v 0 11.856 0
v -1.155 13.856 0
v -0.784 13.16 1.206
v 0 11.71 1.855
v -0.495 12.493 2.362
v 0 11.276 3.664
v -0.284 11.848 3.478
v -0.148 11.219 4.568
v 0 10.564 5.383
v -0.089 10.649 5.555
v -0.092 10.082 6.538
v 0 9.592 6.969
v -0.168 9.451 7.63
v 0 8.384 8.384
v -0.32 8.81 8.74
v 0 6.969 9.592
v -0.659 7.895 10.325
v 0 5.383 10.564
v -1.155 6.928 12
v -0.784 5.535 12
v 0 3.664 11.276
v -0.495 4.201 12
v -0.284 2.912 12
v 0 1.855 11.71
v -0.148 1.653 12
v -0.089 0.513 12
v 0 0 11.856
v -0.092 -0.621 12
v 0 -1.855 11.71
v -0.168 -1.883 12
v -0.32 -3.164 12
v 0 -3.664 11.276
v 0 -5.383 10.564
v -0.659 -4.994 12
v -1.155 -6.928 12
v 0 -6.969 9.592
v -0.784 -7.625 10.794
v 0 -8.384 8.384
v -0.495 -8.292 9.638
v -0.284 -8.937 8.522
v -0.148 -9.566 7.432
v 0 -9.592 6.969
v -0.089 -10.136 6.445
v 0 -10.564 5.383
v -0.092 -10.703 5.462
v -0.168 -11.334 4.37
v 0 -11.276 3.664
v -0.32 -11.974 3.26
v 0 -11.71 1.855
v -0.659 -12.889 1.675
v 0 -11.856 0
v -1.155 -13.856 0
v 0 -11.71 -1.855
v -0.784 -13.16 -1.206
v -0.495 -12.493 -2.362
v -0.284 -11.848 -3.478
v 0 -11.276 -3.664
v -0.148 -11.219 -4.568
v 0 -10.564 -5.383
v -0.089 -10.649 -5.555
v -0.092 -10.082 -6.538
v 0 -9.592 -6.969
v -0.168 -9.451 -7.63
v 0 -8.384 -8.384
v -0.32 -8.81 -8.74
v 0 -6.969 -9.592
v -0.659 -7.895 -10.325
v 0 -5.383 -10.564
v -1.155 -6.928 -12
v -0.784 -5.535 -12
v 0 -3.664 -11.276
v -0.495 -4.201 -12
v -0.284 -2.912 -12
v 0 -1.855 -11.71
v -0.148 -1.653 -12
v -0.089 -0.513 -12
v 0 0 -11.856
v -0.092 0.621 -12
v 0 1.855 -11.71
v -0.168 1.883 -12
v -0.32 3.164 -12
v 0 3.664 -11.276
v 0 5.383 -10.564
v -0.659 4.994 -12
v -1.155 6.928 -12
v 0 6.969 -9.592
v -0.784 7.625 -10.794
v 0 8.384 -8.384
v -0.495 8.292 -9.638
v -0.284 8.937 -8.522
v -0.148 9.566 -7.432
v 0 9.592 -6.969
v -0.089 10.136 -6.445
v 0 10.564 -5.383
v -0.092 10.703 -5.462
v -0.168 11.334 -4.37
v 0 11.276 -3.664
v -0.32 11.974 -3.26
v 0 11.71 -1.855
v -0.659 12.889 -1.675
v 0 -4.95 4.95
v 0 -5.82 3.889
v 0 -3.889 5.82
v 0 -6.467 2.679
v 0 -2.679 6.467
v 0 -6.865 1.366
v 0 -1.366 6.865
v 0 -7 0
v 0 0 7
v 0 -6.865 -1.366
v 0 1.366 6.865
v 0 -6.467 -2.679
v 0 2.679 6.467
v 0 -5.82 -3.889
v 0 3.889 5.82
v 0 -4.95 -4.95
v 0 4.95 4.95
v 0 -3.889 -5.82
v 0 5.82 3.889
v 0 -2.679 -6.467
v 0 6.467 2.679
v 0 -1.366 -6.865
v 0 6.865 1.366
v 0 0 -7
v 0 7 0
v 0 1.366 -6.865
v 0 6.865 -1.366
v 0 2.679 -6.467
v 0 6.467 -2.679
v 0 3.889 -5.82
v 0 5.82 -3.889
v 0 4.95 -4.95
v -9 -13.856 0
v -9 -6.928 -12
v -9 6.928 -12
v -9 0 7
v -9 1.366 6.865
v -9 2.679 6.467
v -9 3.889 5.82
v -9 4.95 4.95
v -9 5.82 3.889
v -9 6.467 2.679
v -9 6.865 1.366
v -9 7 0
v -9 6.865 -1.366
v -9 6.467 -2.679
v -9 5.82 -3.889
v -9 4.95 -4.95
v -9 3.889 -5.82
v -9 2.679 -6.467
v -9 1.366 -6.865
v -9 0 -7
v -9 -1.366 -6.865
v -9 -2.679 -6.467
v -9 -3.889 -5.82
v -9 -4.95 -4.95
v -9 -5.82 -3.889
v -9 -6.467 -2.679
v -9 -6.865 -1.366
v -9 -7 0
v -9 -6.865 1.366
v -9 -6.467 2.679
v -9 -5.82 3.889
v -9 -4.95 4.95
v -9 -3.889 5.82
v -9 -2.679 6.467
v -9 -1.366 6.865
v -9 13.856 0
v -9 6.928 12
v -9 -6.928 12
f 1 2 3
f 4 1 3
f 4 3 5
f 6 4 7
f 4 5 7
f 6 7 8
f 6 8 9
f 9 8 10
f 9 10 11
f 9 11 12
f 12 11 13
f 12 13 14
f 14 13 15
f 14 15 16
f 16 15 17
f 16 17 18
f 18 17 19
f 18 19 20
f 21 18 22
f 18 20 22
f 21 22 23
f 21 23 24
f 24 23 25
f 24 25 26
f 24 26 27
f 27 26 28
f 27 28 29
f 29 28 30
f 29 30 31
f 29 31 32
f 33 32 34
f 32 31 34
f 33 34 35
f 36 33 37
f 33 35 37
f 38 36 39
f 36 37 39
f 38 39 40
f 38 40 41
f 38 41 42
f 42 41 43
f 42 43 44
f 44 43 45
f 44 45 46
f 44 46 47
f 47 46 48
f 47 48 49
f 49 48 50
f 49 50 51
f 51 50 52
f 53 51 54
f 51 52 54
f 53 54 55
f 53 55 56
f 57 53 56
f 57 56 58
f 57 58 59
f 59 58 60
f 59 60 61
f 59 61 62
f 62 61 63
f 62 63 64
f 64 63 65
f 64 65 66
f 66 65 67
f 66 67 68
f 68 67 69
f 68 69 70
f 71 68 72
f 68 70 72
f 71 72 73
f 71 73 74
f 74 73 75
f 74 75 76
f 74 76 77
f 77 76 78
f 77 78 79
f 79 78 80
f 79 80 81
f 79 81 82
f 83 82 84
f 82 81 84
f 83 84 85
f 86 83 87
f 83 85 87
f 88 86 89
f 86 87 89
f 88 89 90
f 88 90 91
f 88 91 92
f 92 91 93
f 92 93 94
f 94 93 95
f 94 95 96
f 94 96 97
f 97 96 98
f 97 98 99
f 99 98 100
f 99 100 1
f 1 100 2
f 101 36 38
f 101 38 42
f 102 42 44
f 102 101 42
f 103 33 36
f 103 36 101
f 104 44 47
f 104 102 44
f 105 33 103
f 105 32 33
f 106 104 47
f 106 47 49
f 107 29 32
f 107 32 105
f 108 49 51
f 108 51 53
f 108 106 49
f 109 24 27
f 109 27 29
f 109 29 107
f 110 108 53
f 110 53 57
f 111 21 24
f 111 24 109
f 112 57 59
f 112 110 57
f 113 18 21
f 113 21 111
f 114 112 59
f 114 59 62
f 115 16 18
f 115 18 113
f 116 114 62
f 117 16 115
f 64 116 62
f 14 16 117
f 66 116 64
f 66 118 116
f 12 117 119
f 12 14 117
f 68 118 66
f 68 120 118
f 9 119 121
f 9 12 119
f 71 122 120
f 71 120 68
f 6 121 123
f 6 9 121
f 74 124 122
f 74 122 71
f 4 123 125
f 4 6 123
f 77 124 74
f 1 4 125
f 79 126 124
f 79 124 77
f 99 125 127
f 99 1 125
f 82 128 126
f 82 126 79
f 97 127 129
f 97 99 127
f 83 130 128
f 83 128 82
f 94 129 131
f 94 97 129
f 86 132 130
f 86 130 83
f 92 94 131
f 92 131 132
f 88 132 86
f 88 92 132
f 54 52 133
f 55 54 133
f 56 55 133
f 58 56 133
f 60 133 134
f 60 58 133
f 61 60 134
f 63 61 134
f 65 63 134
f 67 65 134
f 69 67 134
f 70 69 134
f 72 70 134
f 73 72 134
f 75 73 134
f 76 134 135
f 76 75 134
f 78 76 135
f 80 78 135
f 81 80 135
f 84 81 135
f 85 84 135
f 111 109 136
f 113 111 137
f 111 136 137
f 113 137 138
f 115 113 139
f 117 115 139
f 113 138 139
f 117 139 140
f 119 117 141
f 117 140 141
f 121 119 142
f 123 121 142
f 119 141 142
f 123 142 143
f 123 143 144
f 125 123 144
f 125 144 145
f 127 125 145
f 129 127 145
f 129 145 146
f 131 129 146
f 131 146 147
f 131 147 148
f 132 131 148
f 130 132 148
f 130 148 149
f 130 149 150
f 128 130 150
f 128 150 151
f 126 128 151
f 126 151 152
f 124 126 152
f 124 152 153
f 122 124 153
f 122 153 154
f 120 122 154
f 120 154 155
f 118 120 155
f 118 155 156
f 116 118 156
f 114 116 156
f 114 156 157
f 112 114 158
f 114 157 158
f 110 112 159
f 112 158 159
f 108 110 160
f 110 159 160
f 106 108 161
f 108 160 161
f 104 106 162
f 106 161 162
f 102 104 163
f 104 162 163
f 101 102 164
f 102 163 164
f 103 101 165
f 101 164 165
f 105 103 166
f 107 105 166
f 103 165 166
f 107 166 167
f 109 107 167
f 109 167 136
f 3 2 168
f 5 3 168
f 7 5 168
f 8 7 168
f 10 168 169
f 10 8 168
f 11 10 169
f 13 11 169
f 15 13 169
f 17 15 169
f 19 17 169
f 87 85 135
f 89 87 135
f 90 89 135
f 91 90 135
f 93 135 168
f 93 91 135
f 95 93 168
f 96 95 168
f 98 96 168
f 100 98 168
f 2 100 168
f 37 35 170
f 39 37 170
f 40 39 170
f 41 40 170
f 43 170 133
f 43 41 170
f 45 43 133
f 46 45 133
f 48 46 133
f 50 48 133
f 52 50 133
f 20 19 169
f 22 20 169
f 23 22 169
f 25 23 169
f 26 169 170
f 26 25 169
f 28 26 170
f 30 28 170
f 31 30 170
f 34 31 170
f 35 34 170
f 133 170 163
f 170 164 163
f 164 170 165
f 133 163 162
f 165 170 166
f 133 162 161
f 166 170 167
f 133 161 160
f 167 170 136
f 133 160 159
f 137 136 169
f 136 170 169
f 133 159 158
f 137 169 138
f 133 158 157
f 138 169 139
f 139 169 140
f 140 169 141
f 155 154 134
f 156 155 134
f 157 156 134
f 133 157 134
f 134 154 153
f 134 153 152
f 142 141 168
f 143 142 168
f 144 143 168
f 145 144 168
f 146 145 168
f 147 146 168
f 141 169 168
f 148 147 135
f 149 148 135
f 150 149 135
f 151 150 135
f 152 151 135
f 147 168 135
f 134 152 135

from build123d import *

# Parameters (mm, degrees)
BOSS_EXTRUDE1_DEPTH        = 9
M16X2_0_TAPPED_HOLE1_D     = 14
M16X2_0_TAPPED_HOLE1_DEPTH = 9


with BuildPart() as part:
    # Sketch1 → Boss-Extrude1 (new body)
    with BuildSketch(Plane(origin=(0, 0, 0), x_dir=(0, 0, -1), z_dir=(1, 0, 0))):
        Polygon((12, 6.92820323), (0, 13.856406461), (-12, 6.92820323), (-12, -6.92820323), (0, -13.856406461), (12, -6.92820323), align=None)
    extrude(amount=-BOSS_EXTRUDE1_DEPTH)

    # M16x2.0 Tapped Hole1
    with Locations(Plane(origin=(0, 0, 0), x_dir=(0, 0, -1), z_dir=(1, 0, 0))):
        with Locations((0, 0)):
            Hole(M16X2_0_TAPPED_HOLE1_D / 2, depth=M16X2_0_TAPPED_HOLE1_DEPTH)

    # Sketch10 → Cut-Revolve1 (revolve, cut)
    with BuildSketch(Plane.XY):
        Polygon((0, 13.856406461), (0, 11.856406461), (-1.154700538, 13.856406461), align=None)
    revolve(axis=Axis((0, 0, 0), (1, 0, 0)), mode=Mode.SUBTRACT)


solid = part.part
